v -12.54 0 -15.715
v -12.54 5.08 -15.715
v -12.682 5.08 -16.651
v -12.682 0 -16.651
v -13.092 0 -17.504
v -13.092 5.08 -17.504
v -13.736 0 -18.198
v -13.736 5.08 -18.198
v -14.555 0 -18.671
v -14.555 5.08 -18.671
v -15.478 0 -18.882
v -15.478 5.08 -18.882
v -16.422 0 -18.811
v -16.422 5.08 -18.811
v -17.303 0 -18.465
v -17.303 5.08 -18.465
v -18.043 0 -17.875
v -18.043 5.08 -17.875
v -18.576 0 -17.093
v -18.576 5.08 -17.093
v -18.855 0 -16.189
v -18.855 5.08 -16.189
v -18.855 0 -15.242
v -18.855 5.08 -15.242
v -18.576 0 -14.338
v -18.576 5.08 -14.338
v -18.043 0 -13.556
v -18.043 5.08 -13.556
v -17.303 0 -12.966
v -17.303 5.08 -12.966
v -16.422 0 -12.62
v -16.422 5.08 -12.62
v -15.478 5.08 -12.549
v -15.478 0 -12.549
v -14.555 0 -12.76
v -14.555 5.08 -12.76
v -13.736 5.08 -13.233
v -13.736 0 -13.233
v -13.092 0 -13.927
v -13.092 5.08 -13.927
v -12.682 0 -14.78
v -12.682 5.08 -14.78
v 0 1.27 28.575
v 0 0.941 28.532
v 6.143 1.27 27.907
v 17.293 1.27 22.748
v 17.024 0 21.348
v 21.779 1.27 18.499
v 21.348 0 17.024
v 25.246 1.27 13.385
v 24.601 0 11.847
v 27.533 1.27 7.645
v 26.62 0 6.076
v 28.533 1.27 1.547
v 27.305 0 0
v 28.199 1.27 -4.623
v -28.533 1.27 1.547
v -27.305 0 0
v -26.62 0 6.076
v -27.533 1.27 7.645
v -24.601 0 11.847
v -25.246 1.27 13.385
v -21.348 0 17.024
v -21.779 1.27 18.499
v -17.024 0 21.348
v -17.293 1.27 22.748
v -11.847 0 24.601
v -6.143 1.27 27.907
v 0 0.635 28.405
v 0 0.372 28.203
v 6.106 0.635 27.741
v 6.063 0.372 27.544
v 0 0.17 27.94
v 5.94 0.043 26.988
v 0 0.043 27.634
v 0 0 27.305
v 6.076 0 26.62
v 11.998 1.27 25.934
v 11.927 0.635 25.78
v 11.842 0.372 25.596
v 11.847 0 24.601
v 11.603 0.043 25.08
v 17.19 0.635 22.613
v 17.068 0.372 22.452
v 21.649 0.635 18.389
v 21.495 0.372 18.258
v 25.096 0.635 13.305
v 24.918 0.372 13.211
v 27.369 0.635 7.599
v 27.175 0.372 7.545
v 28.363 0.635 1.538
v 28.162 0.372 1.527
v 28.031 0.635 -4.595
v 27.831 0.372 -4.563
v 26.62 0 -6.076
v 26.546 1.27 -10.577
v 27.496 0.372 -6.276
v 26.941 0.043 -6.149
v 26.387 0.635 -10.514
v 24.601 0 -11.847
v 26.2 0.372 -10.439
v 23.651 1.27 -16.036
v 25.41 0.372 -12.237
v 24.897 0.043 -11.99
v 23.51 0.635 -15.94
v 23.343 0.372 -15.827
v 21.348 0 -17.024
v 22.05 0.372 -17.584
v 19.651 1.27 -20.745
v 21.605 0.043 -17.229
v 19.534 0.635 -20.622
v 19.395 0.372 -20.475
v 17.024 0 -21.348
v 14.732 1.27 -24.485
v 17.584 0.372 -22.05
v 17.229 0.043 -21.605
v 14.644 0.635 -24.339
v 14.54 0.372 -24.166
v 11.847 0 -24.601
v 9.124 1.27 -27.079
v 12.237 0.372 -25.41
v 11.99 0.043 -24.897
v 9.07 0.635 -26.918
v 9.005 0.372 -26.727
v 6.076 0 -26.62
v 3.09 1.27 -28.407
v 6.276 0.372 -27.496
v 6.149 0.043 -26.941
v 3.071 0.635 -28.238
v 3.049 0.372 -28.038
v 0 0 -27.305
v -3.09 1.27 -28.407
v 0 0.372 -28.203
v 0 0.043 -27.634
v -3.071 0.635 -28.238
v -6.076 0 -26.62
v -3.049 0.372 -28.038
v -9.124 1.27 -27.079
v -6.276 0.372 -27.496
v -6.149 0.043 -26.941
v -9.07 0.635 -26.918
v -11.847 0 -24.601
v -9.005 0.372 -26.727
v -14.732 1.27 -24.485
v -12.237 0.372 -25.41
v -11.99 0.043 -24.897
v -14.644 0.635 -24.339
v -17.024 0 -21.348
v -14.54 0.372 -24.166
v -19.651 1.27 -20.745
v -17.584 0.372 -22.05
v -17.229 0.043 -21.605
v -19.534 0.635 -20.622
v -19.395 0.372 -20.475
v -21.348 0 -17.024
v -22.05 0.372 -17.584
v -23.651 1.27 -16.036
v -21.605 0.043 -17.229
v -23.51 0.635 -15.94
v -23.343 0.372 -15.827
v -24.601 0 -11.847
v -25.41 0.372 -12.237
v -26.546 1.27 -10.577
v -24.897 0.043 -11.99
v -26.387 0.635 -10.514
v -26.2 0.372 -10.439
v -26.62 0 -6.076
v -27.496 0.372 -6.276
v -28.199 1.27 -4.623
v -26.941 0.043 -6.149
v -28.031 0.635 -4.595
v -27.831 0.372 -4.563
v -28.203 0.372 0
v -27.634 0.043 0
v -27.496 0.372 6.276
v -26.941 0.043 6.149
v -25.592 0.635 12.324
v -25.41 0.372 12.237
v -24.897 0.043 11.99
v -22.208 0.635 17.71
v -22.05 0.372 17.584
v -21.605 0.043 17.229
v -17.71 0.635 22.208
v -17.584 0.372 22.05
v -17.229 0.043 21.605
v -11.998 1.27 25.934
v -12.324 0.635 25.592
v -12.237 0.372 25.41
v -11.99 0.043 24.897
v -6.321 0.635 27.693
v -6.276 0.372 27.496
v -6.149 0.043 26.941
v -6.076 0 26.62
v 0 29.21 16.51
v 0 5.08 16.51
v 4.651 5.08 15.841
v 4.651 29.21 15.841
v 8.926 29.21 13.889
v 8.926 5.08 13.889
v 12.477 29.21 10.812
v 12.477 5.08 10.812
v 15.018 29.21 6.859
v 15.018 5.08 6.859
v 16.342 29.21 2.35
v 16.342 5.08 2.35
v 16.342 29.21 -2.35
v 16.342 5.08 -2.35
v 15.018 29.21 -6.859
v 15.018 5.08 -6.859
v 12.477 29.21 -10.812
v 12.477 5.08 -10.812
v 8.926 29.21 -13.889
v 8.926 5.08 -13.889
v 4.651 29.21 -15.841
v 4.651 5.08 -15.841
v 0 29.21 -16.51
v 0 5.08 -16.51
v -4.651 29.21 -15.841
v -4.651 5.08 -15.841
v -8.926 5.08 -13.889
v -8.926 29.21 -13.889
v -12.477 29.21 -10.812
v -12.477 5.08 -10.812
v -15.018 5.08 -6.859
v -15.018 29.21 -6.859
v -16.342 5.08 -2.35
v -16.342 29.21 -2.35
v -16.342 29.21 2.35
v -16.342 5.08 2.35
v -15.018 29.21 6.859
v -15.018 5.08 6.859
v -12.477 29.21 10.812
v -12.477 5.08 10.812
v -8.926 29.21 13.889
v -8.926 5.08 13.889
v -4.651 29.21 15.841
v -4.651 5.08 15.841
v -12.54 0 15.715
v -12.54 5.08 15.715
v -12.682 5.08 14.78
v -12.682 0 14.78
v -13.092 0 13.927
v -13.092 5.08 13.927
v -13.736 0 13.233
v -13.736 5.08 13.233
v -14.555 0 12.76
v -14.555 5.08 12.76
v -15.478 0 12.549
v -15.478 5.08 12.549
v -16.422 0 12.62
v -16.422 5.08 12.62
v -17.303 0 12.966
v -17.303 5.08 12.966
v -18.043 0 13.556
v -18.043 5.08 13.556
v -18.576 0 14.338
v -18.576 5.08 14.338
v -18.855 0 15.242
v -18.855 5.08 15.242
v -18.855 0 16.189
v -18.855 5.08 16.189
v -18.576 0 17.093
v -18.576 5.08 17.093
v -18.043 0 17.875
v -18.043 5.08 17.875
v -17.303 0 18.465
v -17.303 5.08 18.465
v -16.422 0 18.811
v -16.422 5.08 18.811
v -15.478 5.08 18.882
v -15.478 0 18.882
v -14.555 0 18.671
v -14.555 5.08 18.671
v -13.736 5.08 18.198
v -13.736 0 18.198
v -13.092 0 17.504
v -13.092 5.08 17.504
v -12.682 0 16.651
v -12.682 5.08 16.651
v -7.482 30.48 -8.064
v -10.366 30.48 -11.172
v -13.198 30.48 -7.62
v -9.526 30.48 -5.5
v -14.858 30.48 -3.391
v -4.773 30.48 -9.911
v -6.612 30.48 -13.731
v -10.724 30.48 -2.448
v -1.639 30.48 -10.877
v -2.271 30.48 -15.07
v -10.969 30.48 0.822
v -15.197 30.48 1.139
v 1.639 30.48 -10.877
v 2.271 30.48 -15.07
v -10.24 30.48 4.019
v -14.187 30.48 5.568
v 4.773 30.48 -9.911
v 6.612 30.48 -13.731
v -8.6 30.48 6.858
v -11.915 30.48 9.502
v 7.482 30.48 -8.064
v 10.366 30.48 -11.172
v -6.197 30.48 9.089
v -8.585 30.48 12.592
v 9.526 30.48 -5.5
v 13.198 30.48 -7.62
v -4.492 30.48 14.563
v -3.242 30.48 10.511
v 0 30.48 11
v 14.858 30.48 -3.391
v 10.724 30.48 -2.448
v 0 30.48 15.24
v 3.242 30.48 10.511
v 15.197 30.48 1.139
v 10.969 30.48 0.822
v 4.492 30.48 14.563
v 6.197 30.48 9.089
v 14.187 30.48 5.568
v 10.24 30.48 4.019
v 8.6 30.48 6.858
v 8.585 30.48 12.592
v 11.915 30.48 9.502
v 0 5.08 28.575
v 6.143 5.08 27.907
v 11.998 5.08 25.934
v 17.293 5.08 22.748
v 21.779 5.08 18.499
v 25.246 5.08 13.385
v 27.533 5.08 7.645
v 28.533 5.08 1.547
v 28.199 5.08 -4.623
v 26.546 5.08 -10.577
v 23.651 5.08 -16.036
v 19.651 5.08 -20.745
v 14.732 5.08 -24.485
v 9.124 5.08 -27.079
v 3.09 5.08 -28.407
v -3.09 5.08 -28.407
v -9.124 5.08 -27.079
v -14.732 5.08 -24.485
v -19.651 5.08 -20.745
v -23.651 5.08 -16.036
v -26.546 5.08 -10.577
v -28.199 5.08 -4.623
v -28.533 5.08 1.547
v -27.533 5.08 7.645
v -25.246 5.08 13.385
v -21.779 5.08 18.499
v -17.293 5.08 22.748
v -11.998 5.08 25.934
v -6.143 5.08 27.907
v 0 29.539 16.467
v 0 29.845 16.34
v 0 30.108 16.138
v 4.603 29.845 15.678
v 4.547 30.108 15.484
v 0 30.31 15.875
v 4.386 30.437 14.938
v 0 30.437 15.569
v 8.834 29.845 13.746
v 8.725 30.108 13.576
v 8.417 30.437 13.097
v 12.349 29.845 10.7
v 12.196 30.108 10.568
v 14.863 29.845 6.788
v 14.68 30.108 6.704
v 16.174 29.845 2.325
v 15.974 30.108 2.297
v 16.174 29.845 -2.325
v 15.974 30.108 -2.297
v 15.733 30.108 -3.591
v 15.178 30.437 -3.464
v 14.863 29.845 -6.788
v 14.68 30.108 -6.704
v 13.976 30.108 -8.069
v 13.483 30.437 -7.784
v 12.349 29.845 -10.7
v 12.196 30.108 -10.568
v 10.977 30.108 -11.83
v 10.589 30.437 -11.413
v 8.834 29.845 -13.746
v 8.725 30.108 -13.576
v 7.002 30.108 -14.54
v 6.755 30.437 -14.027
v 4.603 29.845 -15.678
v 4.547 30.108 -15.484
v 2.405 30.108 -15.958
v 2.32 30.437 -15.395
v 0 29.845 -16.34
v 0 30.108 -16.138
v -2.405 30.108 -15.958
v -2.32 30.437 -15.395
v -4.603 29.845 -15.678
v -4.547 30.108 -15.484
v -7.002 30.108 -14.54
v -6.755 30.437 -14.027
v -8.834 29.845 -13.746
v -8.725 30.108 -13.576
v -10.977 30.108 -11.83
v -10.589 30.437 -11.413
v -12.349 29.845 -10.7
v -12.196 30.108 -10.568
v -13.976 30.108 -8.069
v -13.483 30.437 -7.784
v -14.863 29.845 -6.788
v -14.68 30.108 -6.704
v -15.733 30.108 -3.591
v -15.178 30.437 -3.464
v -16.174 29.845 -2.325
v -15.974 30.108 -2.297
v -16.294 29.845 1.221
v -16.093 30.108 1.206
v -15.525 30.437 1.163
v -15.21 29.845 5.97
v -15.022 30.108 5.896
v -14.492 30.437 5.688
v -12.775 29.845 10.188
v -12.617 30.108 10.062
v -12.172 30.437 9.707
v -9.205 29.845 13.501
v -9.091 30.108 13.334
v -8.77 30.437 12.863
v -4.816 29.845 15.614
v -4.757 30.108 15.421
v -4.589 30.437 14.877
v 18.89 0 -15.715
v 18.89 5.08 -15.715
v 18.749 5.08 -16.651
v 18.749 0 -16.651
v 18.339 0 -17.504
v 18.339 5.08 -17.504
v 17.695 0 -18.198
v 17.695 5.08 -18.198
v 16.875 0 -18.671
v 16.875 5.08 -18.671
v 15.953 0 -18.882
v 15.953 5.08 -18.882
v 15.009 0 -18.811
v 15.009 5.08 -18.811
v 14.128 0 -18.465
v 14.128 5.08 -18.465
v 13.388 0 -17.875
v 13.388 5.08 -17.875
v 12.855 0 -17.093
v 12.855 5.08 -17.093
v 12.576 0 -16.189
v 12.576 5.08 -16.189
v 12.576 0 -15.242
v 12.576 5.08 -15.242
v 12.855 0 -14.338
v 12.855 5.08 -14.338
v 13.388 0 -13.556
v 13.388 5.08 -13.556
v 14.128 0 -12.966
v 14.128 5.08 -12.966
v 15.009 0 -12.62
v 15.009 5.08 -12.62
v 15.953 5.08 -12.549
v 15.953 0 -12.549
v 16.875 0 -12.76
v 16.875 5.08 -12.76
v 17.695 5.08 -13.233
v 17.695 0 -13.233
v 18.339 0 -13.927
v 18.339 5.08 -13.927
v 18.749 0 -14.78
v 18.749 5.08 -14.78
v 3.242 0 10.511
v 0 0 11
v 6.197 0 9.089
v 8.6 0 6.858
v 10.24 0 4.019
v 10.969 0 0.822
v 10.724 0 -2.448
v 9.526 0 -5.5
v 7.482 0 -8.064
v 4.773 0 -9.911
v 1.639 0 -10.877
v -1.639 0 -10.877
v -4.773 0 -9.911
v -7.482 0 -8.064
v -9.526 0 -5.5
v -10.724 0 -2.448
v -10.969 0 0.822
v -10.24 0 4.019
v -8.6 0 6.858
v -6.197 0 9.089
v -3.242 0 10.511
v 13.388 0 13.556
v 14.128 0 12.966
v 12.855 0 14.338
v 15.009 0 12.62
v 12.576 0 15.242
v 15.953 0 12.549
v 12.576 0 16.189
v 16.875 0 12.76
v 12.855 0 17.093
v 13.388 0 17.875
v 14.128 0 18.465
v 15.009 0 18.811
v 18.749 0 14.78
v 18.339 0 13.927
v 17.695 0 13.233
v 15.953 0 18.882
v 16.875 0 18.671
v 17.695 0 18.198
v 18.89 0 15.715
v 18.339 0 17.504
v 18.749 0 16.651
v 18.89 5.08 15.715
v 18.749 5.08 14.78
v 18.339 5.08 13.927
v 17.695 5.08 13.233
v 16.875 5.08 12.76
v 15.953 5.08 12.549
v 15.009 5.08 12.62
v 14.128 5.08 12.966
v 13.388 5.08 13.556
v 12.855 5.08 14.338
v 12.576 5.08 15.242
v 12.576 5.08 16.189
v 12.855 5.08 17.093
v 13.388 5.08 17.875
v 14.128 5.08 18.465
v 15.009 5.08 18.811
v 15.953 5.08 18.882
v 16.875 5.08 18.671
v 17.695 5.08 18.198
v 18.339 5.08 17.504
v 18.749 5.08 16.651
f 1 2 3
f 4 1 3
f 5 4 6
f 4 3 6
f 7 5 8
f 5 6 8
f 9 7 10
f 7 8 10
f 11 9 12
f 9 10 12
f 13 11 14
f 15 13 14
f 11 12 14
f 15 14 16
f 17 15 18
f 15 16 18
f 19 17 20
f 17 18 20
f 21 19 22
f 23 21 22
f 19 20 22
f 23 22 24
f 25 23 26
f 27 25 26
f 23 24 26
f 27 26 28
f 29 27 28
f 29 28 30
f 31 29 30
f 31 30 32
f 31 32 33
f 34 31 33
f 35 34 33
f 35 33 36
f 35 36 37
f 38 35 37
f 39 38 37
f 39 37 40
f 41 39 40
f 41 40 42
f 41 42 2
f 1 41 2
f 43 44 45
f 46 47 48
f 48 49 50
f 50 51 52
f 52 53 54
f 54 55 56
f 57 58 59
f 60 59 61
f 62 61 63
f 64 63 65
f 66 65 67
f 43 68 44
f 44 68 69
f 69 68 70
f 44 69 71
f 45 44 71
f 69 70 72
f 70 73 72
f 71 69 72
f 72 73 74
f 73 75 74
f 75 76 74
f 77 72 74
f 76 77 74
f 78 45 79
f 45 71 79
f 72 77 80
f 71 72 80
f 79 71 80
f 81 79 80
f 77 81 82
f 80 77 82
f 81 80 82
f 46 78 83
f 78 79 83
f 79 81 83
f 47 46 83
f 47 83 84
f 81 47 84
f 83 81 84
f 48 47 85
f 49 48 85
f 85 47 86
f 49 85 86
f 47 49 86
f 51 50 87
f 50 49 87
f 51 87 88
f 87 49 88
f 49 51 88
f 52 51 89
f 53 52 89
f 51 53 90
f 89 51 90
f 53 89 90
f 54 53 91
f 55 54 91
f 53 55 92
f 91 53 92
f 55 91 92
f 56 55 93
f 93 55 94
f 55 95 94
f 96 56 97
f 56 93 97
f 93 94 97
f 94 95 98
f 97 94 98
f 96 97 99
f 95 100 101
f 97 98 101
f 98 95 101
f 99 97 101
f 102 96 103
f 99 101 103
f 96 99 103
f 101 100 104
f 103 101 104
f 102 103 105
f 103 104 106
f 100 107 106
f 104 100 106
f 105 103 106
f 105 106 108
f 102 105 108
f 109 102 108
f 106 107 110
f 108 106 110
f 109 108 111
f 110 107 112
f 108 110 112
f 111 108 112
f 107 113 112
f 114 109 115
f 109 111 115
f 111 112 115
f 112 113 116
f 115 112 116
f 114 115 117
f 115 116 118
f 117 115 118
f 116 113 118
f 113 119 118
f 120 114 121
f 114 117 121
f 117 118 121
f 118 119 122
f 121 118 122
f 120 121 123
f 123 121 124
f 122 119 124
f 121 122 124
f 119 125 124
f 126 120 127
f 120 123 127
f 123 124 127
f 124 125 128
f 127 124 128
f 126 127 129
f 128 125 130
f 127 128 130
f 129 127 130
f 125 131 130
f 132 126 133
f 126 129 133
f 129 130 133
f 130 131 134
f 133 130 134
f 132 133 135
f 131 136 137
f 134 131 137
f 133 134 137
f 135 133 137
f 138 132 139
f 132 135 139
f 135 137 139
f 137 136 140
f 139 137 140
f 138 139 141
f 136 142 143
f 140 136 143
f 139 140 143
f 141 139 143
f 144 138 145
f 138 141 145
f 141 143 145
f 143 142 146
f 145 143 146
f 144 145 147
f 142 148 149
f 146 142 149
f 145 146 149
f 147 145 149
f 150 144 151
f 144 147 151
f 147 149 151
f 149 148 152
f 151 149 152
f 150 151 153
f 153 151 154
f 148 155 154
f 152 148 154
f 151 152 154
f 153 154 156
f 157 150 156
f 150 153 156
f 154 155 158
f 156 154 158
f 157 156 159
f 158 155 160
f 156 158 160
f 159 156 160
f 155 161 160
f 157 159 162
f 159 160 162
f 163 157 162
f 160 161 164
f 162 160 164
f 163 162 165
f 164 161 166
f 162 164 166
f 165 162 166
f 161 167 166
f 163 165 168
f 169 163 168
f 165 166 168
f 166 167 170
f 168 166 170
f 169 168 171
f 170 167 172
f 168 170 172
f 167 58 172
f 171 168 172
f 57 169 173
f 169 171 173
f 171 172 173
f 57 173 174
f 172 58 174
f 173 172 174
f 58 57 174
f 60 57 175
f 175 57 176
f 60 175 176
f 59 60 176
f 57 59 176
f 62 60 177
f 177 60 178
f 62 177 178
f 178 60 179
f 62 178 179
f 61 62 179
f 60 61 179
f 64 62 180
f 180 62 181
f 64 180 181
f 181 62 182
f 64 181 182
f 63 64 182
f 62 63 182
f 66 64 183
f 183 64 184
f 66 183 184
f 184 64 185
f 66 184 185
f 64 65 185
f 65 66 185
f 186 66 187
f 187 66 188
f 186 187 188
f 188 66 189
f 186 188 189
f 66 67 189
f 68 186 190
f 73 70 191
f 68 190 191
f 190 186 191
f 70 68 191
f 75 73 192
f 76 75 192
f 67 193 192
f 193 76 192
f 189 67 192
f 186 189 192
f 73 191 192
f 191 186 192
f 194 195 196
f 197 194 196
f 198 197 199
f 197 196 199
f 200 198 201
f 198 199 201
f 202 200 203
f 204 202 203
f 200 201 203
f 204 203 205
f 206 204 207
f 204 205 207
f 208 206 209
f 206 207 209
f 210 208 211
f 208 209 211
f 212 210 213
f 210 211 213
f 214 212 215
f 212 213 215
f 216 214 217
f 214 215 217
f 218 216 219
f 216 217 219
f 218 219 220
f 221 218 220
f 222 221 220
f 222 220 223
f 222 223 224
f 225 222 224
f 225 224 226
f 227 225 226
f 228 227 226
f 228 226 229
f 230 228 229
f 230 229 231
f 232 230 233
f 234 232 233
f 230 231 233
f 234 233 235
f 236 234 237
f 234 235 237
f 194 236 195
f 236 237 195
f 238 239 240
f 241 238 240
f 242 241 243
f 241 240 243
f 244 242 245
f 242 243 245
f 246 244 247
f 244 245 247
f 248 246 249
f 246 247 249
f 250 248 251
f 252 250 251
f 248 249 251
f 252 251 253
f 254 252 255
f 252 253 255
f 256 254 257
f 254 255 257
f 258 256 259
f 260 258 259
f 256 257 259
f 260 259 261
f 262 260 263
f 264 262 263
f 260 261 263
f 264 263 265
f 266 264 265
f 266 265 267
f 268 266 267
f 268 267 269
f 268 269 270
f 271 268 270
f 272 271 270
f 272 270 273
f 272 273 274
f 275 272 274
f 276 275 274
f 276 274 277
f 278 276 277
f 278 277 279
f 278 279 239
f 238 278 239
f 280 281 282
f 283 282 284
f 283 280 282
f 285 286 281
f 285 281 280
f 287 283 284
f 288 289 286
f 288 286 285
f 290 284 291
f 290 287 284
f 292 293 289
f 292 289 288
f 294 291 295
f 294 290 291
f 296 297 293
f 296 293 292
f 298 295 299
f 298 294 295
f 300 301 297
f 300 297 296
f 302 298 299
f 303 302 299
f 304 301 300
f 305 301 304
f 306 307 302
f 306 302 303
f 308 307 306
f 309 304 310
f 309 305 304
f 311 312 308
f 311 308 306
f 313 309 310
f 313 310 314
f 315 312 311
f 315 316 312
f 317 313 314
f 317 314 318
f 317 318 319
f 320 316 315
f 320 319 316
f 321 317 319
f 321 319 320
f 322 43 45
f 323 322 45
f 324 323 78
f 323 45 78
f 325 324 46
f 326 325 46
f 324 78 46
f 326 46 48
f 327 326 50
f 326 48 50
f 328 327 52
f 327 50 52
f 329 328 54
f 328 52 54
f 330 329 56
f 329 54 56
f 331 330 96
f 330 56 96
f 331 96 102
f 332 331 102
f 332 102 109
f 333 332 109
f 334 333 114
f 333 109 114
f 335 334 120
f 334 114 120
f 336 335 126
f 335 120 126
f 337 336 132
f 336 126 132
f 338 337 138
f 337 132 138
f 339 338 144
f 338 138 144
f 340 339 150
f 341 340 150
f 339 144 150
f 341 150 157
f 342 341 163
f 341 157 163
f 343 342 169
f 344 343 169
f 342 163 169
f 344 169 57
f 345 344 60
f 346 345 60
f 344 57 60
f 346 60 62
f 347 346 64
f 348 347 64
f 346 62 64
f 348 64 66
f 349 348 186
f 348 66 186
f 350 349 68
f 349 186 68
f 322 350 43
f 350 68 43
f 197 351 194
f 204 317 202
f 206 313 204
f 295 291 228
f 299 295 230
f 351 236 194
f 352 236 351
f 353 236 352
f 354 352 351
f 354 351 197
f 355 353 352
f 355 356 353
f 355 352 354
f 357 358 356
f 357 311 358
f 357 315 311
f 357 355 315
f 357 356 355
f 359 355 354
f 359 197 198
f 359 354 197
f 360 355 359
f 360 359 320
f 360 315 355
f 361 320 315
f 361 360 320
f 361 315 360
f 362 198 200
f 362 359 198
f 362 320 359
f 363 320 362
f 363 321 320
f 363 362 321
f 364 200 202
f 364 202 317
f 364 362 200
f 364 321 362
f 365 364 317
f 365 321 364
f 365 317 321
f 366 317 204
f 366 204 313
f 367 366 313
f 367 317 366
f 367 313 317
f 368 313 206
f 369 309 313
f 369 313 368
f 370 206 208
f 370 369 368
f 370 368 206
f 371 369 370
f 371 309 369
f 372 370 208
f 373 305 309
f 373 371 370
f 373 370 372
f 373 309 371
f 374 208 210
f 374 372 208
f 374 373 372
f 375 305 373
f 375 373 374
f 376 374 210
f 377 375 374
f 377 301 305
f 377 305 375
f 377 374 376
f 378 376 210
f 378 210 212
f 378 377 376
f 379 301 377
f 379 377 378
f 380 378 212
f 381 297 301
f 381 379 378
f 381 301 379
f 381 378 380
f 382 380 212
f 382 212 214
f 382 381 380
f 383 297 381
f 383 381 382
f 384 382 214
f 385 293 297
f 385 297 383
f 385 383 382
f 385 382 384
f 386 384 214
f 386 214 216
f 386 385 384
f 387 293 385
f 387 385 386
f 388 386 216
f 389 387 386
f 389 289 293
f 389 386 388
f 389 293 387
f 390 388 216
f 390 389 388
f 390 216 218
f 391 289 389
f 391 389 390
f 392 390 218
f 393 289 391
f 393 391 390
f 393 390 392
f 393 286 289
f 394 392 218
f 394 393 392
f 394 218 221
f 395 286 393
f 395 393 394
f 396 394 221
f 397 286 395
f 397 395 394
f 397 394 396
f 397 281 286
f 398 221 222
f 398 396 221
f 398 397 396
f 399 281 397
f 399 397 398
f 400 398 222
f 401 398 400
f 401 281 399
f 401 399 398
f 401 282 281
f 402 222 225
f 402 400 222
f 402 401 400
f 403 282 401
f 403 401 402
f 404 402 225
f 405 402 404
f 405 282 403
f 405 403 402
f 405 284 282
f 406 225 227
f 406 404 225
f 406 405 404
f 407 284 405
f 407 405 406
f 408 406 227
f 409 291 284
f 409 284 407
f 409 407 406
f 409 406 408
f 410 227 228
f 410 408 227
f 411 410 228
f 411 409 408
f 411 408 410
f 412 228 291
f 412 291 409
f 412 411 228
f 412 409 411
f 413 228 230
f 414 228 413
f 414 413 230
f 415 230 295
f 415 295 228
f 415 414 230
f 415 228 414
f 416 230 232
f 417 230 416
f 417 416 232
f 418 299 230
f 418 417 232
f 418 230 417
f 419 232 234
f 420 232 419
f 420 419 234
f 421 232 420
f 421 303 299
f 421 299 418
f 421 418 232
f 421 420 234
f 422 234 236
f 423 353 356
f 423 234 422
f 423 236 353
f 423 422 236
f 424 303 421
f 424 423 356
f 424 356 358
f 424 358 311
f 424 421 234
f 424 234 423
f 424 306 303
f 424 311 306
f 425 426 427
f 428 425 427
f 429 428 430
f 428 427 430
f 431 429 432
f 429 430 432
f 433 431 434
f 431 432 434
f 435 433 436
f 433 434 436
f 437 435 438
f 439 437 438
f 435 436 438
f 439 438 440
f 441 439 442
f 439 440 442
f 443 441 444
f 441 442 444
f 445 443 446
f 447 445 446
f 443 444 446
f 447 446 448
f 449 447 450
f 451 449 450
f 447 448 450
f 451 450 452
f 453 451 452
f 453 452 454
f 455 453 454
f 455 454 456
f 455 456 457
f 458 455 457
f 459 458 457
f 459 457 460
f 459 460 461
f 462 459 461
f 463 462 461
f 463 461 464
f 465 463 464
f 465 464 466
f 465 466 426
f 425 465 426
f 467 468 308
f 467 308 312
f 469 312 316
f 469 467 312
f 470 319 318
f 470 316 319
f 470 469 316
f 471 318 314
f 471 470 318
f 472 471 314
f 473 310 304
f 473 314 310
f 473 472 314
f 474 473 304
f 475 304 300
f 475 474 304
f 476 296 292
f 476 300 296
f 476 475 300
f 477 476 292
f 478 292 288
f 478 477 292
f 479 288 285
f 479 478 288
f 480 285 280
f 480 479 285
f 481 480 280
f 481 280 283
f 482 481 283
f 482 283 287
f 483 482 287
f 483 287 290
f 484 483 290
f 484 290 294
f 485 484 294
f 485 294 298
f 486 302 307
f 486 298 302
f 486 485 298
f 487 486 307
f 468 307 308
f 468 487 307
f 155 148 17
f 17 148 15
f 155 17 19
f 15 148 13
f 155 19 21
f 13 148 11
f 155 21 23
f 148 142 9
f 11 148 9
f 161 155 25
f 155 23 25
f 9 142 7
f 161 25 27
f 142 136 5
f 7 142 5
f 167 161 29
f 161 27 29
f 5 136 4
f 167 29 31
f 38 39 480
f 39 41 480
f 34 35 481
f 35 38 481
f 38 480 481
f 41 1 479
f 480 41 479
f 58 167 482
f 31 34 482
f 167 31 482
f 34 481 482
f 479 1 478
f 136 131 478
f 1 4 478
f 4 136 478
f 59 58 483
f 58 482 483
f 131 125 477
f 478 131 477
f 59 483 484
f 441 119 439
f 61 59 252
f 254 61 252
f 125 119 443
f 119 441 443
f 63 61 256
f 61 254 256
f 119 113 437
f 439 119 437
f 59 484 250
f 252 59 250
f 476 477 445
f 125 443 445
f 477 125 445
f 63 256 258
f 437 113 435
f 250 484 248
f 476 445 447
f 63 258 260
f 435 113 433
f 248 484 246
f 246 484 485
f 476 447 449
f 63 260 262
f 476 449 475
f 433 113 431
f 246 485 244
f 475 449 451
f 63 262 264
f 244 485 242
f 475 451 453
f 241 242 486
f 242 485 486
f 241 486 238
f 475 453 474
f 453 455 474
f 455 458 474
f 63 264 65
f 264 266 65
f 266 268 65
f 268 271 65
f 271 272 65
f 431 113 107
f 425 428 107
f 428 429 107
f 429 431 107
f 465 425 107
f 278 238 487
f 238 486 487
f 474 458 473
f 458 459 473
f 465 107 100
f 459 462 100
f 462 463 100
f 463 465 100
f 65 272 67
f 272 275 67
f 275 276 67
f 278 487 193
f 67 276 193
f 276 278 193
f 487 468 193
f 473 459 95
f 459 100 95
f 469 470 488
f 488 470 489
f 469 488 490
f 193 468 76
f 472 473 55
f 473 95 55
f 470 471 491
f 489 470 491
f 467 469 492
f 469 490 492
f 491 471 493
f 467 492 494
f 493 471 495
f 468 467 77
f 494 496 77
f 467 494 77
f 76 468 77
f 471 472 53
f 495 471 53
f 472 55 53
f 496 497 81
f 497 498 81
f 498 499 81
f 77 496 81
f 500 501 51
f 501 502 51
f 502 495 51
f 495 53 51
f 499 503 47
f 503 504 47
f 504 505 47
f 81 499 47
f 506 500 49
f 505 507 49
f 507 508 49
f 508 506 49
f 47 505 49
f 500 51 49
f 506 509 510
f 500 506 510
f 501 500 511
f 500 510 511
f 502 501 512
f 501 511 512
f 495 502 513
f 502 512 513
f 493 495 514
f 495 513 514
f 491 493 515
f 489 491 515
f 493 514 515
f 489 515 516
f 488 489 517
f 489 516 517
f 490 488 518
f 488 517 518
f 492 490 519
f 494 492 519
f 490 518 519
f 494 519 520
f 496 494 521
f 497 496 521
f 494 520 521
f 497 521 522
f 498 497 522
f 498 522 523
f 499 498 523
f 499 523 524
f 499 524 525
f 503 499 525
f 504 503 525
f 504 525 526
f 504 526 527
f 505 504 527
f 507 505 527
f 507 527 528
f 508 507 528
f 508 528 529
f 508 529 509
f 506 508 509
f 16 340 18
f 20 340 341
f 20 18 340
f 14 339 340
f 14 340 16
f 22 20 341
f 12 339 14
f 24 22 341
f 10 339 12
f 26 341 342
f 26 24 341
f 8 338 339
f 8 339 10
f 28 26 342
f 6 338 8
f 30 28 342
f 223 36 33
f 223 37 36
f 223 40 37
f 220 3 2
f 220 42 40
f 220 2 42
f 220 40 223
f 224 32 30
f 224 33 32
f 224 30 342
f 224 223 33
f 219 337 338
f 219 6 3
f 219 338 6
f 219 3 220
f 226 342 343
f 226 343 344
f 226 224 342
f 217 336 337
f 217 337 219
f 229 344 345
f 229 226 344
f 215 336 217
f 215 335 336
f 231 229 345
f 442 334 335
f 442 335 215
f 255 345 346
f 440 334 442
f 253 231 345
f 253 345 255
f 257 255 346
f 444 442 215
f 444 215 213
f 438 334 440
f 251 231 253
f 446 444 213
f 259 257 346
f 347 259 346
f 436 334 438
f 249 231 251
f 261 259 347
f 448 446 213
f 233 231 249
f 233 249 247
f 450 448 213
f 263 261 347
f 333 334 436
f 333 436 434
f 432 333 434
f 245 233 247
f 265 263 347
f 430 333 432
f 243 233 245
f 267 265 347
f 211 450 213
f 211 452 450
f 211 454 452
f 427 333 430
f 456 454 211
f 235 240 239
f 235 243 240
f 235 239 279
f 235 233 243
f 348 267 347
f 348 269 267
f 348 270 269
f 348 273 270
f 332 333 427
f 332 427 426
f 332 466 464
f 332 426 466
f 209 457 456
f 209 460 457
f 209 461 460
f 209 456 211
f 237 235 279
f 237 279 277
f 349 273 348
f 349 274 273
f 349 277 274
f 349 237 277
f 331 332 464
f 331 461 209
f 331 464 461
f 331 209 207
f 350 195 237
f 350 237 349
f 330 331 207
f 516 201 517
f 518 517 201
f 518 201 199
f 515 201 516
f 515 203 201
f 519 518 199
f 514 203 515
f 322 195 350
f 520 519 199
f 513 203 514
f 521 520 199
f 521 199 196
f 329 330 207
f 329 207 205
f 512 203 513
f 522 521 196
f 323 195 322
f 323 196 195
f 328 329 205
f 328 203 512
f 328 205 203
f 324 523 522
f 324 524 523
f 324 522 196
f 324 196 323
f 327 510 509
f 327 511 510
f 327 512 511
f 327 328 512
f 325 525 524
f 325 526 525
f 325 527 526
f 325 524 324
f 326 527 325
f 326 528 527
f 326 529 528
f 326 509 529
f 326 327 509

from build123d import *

# Parameters (mm, degrees)
SKETCH1_R                       = 28.575
BOSS_EXTRUDE1_DEPTH             = 5.08
SKETCH2_R                       = 16.51
BOSS_EXTRUDE2_DEPTH             = 25.4
F_1_4_0_25_DIAMETER_HOLE1_D     = 6.35
F_1_4_0_25_DIAMETER_HOLE1_DEPTH = 8.89
F_1_4_0_25_DIAMETER_HOLE1_TIP   = 1.907732465
CUT_EXTRUDE1_DEPTH              = 51.617108274
CUT_EXTRUDE1_DEPTH_BACK         = 51.617108274
SKETCH5_R                       = 11
FILLET1_R                       = 1.27


with BuildPart() as part:
    # Sketch1 → Boss-Extrude1 (new body)
    with BuildSketch(Plane(origin=(0, 0, 0), x_dir=(1, 0, 0), z_dir=(0, 1, 0))):
        with Locations(Location((0, 0, 0), (0, 0, 270))):
            Circle(SKETCH1_R)
    extrude(amount=BOSS_EXTRUDE1_DEPTH)

    # Sketch2 → Boss-Extrude2 (add)
    with BuildSketch(Plane(origin=(0, 5.08, 0), x_dir=(1, 0, 0), z_dir=(0, 1, 0))):
        with Locations(Location((0, 0, 0), (0, 0, 270))):
            Circle(SKETCH2_R)
    extrude(amount=BOSS_EXTRUDE2_DEPTH)

    # 1/4 (0.25) Diameter Hole1
    with Locations(Plane(origin=(0, 0, 0), x_dir=(-1, 0, 0), z_dir=(0, -1, 0))):
        with Locations((15.715448212, 15.715448212), (-15.715448212, 15.715448212), (-15.715448212, -15.715448212), (15.715448212, -15.715448212)):
            Hole(F_1_4_0_25_DIAMETER_HOLE1_D / 2, depth=F_1_4_0_25_DIAMETER_HOLE1_DEPTH)
            with Locations((0, 0, -(F_1_4_0_25_DIAMETER_HOLE1_DEPTH + F_1_4_0_25_DIAMETER_HOLE1_TIP / 2))):  # 118° drill point
                Cone(0, F_1_4_0_25_DIAMETER_HOLE1_D / 2, F_1_4_0_25_DIAMETER_HOLE1_TIP, mode=Mode.SUBTRACT)

    # Sketch5 → Cut-Extrude1 (cut, two sides: drawn at the far end of the back side and taken through both)
    with BuildSketch(Plane(origin=(0, 30.48, 0), x_dir=(1, 0, 0), z_dir=(0, 1, 0)).offset(-CUT_EXTRUDE1_DEPTH_BACK)):
        with Locations(Location((0, 0, 0), (0, 0, 270))):
            Circle(SKETCH5_R)
    extrude(amount=CUT_EXTRUDE1_DEPTH + CUT_EXTRUDE1_DEPTH_BACK, mode=Mode.SUBTRACT)

    # Fillet1
    fillet1_edges = [part.edges().sort_by_distance(p)[0] for p in [
        (0, 0, -28.575),
        (0, 30.48, -16.51),
    ]]
    fillet(fillet1_edges, radius=FILLET1_R)


solid = part.part
